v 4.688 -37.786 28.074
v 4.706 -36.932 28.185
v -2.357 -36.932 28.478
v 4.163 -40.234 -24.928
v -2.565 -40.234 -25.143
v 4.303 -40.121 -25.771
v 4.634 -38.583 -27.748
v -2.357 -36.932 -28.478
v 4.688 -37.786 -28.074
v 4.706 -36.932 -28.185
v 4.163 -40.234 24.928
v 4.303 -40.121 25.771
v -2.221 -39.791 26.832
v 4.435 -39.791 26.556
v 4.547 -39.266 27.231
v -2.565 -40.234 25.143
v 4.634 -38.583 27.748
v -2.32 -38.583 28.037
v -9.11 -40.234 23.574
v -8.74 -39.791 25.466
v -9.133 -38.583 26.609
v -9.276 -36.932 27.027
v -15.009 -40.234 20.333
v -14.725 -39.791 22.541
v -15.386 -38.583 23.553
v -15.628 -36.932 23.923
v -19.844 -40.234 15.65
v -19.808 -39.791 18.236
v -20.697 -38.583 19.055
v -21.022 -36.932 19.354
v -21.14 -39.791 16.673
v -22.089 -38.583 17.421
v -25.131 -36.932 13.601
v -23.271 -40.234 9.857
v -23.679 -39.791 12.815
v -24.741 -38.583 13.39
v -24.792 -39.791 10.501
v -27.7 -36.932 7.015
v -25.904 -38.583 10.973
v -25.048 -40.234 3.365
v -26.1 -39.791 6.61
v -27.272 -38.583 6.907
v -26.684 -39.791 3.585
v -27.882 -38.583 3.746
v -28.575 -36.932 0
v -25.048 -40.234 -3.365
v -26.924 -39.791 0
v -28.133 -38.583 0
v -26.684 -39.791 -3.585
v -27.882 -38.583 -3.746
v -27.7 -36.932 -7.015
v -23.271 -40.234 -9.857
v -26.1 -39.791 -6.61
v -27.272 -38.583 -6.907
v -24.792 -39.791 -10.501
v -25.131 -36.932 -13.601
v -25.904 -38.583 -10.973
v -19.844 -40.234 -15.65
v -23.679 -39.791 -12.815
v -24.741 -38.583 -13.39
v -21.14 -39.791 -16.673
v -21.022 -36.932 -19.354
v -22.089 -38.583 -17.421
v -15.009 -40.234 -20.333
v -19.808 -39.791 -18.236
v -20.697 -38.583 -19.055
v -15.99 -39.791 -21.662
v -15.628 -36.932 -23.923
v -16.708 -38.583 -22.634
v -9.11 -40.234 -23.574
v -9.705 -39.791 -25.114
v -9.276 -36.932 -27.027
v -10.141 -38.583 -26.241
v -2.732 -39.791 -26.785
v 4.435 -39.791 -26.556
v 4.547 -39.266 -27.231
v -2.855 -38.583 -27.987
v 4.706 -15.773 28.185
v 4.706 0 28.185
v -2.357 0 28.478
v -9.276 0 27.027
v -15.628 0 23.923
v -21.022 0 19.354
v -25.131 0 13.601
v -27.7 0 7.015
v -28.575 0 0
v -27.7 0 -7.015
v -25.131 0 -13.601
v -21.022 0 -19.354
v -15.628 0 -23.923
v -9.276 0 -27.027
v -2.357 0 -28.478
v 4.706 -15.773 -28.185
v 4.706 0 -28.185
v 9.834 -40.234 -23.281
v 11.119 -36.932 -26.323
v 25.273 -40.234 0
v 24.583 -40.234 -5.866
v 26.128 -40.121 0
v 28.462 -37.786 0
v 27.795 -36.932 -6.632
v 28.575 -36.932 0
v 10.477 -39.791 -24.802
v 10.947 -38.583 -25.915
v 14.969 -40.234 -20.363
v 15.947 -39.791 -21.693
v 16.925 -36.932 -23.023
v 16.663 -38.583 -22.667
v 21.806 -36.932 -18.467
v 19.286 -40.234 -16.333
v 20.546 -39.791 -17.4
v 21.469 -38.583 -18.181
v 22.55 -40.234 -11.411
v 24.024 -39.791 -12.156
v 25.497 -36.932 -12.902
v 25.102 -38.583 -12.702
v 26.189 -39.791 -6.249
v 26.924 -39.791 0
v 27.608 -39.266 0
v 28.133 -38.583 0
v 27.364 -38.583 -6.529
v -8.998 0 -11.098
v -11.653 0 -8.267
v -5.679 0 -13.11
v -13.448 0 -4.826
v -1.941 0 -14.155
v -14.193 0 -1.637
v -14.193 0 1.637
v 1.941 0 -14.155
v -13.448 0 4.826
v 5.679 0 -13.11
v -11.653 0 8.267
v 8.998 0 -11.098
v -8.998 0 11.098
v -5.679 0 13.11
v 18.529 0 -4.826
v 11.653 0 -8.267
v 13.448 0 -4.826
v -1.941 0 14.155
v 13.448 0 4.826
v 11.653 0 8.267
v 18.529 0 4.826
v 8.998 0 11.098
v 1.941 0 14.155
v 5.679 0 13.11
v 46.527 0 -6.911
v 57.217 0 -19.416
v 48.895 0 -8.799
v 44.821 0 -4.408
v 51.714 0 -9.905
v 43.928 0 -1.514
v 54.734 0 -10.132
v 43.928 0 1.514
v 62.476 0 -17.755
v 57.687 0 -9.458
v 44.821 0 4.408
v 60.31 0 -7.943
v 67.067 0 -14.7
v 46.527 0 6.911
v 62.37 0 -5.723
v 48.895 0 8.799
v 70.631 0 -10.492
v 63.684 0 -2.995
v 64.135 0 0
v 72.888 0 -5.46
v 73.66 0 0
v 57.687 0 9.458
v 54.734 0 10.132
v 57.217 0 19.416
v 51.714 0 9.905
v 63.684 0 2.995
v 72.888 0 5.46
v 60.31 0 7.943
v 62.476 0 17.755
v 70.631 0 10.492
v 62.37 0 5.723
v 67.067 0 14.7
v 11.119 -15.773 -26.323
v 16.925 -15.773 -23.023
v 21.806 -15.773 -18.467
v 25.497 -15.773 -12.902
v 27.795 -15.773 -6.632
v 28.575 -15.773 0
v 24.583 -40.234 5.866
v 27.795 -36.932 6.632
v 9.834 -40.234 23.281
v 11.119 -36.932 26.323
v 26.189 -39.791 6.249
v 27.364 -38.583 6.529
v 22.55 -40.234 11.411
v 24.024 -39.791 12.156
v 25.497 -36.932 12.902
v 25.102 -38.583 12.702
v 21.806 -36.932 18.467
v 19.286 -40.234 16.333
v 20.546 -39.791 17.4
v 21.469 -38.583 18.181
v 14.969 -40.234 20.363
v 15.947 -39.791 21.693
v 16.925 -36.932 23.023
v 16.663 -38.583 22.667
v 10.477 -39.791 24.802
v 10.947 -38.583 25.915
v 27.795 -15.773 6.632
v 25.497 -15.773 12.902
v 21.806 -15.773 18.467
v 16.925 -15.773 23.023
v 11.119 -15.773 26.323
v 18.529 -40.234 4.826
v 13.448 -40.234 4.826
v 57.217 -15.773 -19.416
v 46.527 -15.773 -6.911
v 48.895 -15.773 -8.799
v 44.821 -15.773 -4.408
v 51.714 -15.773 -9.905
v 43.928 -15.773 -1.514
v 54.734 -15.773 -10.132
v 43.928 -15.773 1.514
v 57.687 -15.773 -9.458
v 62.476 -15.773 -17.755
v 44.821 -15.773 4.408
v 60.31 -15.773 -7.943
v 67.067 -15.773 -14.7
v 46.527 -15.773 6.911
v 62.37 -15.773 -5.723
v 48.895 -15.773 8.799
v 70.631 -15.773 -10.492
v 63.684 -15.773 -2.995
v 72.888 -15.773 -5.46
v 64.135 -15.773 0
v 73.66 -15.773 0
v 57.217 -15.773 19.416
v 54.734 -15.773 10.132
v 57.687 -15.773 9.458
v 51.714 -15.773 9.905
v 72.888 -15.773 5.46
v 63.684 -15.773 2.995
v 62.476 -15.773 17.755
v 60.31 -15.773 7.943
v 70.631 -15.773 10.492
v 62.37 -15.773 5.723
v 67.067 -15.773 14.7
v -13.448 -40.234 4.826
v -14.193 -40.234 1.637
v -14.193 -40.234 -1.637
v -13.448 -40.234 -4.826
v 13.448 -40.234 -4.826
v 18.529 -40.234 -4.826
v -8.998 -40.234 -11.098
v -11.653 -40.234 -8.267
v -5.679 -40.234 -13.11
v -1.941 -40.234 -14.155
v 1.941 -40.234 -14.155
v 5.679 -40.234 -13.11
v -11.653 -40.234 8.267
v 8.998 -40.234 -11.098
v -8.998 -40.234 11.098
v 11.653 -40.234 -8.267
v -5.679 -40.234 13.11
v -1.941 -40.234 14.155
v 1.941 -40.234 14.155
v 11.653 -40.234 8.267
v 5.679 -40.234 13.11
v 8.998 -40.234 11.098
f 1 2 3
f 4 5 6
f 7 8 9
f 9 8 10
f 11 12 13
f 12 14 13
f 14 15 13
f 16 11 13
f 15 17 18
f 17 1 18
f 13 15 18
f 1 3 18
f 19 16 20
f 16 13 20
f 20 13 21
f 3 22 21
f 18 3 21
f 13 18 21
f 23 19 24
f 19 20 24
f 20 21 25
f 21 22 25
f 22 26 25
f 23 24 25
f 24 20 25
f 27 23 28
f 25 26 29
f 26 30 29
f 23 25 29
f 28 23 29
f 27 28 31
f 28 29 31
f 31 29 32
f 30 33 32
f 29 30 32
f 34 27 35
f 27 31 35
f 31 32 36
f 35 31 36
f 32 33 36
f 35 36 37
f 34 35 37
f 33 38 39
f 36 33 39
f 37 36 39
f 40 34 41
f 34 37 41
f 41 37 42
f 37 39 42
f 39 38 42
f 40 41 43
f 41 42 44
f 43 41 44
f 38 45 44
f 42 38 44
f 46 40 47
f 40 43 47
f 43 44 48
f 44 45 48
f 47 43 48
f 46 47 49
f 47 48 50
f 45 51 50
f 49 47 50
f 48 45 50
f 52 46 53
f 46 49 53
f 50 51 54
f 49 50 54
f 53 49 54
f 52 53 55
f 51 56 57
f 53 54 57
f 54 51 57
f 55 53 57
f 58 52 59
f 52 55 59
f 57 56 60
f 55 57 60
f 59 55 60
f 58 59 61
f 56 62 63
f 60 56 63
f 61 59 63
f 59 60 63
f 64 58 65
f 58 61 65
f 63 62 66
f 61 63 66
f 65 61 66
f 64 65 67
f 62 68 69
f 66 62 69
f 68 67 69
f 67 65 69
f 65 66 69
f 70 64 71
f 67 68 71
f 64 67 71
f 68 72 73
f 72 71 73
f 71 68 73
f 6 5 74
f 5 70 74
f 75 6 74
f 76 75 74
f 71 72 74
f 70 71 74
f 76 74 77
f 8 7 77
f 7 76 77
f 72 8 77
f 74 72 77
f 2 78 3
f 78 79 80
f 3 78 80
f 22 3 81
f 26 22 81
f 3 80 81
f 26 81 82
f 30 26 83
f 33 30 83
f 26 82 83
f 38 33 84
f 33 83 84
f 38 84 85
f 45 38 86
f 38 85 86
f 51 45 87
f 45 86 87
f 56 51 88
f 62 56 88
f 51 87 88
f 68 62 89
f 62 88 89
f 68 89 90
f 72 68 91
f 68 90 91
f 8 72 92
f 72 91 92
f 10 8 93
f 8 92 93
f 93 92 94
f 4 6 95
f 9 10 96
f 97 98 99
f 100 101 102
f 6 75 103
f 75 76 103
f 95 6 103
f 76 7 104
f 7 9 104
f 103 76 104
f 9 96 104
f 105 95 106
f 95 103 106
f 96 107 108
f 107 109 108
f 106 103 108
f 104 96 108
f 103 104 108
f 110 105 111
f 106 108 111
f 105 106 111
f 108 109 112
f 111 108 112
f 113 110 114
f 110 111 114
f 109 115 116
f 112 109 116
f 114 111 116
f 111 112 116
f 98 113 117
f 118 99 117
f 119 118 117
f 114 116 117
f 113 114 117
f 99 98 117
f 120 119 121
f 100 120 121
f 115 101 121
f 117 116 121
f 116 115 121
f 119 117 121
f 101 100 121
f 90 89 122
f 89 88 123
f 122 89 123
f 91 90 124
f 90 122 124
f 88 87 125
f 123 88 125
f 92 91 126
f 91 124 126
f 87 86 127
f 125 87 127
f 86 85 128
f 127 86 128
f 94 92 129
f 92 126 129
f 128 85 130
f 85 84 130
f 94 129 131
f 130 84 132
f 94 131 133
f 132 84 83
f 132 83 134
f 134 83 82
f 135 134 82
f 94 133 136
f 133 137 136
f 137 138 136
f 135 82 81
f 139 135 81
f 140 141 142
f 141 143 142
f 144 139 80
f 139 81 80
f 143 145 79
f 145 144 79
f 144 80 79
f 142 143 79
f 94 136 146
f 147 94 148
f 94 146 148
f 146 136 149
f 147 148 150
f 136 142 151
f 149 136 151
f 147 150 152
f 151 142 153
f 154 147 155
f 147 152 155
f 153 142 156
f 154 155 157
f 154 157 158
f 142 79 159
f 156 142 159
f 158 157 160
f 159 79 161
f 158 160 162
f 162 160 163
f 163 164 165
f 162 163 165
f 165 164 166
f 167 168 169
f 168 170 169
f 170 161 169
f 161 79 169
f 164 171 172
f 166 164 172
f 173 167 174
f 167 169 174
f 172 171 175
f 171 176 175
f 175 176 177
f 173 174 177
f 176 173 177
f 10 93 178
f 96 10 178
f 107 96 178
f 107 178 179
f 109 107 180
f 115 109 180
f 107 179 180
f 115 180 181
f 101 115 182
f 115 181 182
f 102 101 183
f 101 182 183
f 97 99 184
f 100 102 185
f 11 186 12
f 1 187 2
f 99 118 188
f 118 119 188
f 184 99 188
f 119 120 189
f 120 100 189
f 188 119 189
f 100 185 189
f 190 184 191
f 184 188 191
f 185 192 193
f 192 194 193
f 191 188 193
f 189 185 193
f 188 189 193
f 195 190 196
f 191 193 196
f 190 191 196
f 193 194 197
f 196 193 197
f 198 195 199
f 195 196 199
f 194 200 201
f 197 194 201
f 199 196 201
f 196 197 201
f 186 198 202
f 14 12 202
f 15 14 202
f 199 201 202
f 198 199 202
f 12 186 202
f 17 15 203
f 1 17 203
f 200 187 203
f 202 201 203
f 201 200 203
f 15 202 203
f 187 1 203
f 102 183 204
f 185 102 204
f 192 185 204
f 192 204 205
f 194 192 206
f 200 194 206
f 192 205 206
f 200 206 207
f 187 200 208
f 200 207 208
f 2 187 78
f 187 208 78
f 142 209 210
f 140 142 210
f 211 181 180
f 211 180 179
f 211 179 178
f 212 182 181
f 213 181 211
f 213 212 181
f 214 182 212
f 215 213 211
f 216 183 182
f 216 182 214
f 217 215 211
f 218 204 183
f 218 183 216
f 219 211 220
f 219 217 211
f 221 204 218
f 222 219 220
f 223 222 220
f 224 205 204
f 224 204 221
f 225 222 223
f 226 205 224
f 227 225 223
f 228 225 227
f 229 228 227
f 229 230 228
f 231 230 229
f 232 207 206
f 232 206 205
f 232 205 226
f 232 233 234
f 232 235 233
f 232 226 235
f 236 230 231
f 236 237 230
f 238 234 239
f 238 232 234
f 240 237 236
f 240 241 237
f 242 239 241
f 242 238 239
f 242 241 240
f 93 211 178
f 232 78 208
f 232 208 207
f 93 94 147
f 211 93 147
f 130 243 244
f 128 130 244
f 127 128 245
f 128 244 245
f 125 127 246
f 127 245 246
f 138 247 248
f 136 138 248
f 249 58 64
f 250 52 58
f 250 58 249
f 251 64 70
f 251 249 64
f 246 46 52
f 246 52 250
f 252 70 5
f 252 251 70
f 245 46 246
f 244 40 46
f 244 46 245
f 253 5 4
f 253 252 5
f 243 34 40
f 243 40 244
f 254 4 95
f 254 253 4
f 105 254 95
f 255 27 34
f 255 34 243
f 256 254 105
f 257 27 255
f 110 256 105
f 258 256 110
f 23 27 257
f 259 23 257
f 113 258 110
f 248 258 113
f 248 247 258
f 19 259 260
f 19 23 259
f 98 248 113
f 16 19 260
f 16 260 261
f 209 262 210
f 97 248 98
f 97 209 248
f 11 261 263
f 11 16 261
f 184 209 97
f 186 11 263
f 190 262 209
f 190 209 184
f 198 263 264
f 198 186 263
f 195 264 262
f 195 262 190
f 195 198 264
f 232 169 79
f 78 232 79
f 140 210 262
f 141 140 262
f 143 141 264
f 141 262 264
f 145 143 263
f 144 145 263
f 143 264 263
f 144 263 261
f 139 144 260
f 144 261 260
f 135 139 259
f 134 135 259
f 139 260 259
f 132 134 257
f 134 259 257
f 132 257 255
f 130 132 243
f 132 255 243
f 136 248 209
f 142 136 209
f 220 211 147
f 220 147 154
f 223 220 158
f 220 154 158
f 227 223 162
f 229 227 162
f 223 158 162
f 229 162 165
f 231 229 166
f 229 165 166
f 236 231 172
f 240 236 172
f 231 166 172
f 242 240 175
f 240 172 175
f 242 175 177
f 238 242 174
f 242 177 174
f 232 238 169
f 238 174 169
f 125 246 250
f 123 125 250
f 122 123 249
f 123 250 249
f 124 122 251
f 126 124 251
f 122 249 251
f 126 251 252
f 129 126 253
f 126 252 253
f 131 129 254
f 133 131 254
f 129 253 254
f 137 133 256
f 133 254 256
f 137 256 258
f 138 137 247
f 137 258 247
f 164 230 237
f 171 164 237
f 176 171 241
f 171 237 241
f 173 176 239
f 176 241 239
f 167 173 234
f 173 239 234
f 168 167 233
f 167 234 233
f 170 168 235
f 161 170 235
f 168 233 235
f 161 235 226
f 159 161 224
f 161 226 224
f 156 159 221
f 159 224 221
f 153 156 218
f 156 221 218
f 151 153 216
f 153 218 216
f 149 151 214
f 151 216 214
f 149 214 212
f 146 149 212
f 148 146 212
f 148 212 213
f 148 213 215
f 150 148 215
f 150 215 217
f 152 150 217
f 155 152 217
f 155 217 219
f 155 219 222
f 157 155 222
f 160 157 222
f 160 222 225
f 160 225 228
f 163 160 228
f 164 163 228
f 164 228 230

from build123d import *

# Parameters (mm, degrees)
F1_DEPTH = 15.7734
F2_R     = 10.16
F3_DEPTH = 15.7744
F4_DEPTH = 40.2336
F6_DEPTH = 40.2346
F7_R     = 3.302


with BuildPart() as f1:
    # F0 (on Front) → F1 (new body)
    with BuildSketch(Plane.XZ):
        with BuildLine():
            ThreePointArc((4.7064705882, 28.1847433836), (21.8061691049, 18.4667705344), (28.575, 0))
            ThreePointArc((28.575, 0), (21.8061691049, -18.4667705344), (4.7064705882, -28.1847433836))
            Line((4.7064705882, -28.1847433836), (57.2172352941, -19.4161565532))
            ThreePointArc((57.2172352941, -19.4161565532), (73.66, 0), (57.2172352941, 19.4161565532))
            Line((57.2172352941, 19.4161565532), (4.7064705882, 28.1847433836))
        make_face()
    extrude(amount=F1_DEPTH)

    # F2 (on face) → F3 (cut, through all)
    with BuildSketch(Plane.XZ.offset(15.7734)):
        with Locations((53.975, 0)):
            Circle(F2_R)
    extrude(amount=-F3_DEPTH, mode=Mode.SUBTRACT)

    # F0 (on Front) → F4 (join)
    with BuildSketch(Plane.XZ):
        with BuildLine():
            ThreePointArc((4.7064705882, -28.1847433836), (21.8061691049, -18.4667705344), (28.575, 0))
            ThreePointArc((28.575, 0), (21.8061691049, 18.4667705344), (4.7064705882, 28.1847433836))
            ThreePointArc((4.7064705882, 28.1847433836), (-28.575, 0), (4.7064705882, -28.1847433836))
        make_face()
    extrude(amount=F4_DEPTH)

    # F5 (on face) → F6 (cut, through all)
    with BuildSketch(Plane.XZ.offset(40.2336)):
        with BuildLine():
            ThreePointArc((13.4477648793, -4.826), (14.0760007986, -2.4492565746), (14.2875, 0))
            ThreePointArc((14.2875, 0), (14.0760007986, 2.4492565746), (13.4477648793, 4.826))
            Line((13.4477648793, 4.826), (-13.4477648793, 4.826))
            ThreePointArc((-13.4477648793, 4.826), (-14.2875, 0), (-13.4477648793, -4.826))
            Line((-13.4477648793, -4.826), (13.4477648793, -4.826))
        make_face()
        with BuildLine():
            Line((-13.4477648793, 4.826), (13.4477648793, 4.826))
            ThreePointArc((13.4477648793, 4.826), (0, 14.2875), (-13.4477648793, 4.826))
        make_face()
        with BuildLine():
            ThreePointArc((-13.4477648793, -4.826), (0, -14.2875), (13.4477648793, -4.826))
            Line((13.4477648793, -4.826), (-13.4477648793, -4.826))
        make_face()
        with BuildLine():
            ThreePointArc((13.4477648793, 4.826), (14.0760007986, 2.4492565746), (14.2875, 0))
            ThreePointArc((14.2875, 0), (14.0760007986, -2.4492565746), (13.4477648793, -4.826))
            Line((13.4477648793, -4.826), (18.5293, -4.826))
            Line((18.5293, -4.826), (18.5293, 4.826))
            Line((18.5293, 4.826), (13.4477648793, 4.826))
        make_face()
    extrude(amount=-F6_DEPTH, mode=Mode.SUBTRACT)

    # F7
    f7_edges = [f1.edges().sort_by_distance(p)[0] for p in [
        (-4.706471, -40.2336, 28.184743),
    ]]
    fillet(f7_edges, radius=F7_R)


solid = f1.part
